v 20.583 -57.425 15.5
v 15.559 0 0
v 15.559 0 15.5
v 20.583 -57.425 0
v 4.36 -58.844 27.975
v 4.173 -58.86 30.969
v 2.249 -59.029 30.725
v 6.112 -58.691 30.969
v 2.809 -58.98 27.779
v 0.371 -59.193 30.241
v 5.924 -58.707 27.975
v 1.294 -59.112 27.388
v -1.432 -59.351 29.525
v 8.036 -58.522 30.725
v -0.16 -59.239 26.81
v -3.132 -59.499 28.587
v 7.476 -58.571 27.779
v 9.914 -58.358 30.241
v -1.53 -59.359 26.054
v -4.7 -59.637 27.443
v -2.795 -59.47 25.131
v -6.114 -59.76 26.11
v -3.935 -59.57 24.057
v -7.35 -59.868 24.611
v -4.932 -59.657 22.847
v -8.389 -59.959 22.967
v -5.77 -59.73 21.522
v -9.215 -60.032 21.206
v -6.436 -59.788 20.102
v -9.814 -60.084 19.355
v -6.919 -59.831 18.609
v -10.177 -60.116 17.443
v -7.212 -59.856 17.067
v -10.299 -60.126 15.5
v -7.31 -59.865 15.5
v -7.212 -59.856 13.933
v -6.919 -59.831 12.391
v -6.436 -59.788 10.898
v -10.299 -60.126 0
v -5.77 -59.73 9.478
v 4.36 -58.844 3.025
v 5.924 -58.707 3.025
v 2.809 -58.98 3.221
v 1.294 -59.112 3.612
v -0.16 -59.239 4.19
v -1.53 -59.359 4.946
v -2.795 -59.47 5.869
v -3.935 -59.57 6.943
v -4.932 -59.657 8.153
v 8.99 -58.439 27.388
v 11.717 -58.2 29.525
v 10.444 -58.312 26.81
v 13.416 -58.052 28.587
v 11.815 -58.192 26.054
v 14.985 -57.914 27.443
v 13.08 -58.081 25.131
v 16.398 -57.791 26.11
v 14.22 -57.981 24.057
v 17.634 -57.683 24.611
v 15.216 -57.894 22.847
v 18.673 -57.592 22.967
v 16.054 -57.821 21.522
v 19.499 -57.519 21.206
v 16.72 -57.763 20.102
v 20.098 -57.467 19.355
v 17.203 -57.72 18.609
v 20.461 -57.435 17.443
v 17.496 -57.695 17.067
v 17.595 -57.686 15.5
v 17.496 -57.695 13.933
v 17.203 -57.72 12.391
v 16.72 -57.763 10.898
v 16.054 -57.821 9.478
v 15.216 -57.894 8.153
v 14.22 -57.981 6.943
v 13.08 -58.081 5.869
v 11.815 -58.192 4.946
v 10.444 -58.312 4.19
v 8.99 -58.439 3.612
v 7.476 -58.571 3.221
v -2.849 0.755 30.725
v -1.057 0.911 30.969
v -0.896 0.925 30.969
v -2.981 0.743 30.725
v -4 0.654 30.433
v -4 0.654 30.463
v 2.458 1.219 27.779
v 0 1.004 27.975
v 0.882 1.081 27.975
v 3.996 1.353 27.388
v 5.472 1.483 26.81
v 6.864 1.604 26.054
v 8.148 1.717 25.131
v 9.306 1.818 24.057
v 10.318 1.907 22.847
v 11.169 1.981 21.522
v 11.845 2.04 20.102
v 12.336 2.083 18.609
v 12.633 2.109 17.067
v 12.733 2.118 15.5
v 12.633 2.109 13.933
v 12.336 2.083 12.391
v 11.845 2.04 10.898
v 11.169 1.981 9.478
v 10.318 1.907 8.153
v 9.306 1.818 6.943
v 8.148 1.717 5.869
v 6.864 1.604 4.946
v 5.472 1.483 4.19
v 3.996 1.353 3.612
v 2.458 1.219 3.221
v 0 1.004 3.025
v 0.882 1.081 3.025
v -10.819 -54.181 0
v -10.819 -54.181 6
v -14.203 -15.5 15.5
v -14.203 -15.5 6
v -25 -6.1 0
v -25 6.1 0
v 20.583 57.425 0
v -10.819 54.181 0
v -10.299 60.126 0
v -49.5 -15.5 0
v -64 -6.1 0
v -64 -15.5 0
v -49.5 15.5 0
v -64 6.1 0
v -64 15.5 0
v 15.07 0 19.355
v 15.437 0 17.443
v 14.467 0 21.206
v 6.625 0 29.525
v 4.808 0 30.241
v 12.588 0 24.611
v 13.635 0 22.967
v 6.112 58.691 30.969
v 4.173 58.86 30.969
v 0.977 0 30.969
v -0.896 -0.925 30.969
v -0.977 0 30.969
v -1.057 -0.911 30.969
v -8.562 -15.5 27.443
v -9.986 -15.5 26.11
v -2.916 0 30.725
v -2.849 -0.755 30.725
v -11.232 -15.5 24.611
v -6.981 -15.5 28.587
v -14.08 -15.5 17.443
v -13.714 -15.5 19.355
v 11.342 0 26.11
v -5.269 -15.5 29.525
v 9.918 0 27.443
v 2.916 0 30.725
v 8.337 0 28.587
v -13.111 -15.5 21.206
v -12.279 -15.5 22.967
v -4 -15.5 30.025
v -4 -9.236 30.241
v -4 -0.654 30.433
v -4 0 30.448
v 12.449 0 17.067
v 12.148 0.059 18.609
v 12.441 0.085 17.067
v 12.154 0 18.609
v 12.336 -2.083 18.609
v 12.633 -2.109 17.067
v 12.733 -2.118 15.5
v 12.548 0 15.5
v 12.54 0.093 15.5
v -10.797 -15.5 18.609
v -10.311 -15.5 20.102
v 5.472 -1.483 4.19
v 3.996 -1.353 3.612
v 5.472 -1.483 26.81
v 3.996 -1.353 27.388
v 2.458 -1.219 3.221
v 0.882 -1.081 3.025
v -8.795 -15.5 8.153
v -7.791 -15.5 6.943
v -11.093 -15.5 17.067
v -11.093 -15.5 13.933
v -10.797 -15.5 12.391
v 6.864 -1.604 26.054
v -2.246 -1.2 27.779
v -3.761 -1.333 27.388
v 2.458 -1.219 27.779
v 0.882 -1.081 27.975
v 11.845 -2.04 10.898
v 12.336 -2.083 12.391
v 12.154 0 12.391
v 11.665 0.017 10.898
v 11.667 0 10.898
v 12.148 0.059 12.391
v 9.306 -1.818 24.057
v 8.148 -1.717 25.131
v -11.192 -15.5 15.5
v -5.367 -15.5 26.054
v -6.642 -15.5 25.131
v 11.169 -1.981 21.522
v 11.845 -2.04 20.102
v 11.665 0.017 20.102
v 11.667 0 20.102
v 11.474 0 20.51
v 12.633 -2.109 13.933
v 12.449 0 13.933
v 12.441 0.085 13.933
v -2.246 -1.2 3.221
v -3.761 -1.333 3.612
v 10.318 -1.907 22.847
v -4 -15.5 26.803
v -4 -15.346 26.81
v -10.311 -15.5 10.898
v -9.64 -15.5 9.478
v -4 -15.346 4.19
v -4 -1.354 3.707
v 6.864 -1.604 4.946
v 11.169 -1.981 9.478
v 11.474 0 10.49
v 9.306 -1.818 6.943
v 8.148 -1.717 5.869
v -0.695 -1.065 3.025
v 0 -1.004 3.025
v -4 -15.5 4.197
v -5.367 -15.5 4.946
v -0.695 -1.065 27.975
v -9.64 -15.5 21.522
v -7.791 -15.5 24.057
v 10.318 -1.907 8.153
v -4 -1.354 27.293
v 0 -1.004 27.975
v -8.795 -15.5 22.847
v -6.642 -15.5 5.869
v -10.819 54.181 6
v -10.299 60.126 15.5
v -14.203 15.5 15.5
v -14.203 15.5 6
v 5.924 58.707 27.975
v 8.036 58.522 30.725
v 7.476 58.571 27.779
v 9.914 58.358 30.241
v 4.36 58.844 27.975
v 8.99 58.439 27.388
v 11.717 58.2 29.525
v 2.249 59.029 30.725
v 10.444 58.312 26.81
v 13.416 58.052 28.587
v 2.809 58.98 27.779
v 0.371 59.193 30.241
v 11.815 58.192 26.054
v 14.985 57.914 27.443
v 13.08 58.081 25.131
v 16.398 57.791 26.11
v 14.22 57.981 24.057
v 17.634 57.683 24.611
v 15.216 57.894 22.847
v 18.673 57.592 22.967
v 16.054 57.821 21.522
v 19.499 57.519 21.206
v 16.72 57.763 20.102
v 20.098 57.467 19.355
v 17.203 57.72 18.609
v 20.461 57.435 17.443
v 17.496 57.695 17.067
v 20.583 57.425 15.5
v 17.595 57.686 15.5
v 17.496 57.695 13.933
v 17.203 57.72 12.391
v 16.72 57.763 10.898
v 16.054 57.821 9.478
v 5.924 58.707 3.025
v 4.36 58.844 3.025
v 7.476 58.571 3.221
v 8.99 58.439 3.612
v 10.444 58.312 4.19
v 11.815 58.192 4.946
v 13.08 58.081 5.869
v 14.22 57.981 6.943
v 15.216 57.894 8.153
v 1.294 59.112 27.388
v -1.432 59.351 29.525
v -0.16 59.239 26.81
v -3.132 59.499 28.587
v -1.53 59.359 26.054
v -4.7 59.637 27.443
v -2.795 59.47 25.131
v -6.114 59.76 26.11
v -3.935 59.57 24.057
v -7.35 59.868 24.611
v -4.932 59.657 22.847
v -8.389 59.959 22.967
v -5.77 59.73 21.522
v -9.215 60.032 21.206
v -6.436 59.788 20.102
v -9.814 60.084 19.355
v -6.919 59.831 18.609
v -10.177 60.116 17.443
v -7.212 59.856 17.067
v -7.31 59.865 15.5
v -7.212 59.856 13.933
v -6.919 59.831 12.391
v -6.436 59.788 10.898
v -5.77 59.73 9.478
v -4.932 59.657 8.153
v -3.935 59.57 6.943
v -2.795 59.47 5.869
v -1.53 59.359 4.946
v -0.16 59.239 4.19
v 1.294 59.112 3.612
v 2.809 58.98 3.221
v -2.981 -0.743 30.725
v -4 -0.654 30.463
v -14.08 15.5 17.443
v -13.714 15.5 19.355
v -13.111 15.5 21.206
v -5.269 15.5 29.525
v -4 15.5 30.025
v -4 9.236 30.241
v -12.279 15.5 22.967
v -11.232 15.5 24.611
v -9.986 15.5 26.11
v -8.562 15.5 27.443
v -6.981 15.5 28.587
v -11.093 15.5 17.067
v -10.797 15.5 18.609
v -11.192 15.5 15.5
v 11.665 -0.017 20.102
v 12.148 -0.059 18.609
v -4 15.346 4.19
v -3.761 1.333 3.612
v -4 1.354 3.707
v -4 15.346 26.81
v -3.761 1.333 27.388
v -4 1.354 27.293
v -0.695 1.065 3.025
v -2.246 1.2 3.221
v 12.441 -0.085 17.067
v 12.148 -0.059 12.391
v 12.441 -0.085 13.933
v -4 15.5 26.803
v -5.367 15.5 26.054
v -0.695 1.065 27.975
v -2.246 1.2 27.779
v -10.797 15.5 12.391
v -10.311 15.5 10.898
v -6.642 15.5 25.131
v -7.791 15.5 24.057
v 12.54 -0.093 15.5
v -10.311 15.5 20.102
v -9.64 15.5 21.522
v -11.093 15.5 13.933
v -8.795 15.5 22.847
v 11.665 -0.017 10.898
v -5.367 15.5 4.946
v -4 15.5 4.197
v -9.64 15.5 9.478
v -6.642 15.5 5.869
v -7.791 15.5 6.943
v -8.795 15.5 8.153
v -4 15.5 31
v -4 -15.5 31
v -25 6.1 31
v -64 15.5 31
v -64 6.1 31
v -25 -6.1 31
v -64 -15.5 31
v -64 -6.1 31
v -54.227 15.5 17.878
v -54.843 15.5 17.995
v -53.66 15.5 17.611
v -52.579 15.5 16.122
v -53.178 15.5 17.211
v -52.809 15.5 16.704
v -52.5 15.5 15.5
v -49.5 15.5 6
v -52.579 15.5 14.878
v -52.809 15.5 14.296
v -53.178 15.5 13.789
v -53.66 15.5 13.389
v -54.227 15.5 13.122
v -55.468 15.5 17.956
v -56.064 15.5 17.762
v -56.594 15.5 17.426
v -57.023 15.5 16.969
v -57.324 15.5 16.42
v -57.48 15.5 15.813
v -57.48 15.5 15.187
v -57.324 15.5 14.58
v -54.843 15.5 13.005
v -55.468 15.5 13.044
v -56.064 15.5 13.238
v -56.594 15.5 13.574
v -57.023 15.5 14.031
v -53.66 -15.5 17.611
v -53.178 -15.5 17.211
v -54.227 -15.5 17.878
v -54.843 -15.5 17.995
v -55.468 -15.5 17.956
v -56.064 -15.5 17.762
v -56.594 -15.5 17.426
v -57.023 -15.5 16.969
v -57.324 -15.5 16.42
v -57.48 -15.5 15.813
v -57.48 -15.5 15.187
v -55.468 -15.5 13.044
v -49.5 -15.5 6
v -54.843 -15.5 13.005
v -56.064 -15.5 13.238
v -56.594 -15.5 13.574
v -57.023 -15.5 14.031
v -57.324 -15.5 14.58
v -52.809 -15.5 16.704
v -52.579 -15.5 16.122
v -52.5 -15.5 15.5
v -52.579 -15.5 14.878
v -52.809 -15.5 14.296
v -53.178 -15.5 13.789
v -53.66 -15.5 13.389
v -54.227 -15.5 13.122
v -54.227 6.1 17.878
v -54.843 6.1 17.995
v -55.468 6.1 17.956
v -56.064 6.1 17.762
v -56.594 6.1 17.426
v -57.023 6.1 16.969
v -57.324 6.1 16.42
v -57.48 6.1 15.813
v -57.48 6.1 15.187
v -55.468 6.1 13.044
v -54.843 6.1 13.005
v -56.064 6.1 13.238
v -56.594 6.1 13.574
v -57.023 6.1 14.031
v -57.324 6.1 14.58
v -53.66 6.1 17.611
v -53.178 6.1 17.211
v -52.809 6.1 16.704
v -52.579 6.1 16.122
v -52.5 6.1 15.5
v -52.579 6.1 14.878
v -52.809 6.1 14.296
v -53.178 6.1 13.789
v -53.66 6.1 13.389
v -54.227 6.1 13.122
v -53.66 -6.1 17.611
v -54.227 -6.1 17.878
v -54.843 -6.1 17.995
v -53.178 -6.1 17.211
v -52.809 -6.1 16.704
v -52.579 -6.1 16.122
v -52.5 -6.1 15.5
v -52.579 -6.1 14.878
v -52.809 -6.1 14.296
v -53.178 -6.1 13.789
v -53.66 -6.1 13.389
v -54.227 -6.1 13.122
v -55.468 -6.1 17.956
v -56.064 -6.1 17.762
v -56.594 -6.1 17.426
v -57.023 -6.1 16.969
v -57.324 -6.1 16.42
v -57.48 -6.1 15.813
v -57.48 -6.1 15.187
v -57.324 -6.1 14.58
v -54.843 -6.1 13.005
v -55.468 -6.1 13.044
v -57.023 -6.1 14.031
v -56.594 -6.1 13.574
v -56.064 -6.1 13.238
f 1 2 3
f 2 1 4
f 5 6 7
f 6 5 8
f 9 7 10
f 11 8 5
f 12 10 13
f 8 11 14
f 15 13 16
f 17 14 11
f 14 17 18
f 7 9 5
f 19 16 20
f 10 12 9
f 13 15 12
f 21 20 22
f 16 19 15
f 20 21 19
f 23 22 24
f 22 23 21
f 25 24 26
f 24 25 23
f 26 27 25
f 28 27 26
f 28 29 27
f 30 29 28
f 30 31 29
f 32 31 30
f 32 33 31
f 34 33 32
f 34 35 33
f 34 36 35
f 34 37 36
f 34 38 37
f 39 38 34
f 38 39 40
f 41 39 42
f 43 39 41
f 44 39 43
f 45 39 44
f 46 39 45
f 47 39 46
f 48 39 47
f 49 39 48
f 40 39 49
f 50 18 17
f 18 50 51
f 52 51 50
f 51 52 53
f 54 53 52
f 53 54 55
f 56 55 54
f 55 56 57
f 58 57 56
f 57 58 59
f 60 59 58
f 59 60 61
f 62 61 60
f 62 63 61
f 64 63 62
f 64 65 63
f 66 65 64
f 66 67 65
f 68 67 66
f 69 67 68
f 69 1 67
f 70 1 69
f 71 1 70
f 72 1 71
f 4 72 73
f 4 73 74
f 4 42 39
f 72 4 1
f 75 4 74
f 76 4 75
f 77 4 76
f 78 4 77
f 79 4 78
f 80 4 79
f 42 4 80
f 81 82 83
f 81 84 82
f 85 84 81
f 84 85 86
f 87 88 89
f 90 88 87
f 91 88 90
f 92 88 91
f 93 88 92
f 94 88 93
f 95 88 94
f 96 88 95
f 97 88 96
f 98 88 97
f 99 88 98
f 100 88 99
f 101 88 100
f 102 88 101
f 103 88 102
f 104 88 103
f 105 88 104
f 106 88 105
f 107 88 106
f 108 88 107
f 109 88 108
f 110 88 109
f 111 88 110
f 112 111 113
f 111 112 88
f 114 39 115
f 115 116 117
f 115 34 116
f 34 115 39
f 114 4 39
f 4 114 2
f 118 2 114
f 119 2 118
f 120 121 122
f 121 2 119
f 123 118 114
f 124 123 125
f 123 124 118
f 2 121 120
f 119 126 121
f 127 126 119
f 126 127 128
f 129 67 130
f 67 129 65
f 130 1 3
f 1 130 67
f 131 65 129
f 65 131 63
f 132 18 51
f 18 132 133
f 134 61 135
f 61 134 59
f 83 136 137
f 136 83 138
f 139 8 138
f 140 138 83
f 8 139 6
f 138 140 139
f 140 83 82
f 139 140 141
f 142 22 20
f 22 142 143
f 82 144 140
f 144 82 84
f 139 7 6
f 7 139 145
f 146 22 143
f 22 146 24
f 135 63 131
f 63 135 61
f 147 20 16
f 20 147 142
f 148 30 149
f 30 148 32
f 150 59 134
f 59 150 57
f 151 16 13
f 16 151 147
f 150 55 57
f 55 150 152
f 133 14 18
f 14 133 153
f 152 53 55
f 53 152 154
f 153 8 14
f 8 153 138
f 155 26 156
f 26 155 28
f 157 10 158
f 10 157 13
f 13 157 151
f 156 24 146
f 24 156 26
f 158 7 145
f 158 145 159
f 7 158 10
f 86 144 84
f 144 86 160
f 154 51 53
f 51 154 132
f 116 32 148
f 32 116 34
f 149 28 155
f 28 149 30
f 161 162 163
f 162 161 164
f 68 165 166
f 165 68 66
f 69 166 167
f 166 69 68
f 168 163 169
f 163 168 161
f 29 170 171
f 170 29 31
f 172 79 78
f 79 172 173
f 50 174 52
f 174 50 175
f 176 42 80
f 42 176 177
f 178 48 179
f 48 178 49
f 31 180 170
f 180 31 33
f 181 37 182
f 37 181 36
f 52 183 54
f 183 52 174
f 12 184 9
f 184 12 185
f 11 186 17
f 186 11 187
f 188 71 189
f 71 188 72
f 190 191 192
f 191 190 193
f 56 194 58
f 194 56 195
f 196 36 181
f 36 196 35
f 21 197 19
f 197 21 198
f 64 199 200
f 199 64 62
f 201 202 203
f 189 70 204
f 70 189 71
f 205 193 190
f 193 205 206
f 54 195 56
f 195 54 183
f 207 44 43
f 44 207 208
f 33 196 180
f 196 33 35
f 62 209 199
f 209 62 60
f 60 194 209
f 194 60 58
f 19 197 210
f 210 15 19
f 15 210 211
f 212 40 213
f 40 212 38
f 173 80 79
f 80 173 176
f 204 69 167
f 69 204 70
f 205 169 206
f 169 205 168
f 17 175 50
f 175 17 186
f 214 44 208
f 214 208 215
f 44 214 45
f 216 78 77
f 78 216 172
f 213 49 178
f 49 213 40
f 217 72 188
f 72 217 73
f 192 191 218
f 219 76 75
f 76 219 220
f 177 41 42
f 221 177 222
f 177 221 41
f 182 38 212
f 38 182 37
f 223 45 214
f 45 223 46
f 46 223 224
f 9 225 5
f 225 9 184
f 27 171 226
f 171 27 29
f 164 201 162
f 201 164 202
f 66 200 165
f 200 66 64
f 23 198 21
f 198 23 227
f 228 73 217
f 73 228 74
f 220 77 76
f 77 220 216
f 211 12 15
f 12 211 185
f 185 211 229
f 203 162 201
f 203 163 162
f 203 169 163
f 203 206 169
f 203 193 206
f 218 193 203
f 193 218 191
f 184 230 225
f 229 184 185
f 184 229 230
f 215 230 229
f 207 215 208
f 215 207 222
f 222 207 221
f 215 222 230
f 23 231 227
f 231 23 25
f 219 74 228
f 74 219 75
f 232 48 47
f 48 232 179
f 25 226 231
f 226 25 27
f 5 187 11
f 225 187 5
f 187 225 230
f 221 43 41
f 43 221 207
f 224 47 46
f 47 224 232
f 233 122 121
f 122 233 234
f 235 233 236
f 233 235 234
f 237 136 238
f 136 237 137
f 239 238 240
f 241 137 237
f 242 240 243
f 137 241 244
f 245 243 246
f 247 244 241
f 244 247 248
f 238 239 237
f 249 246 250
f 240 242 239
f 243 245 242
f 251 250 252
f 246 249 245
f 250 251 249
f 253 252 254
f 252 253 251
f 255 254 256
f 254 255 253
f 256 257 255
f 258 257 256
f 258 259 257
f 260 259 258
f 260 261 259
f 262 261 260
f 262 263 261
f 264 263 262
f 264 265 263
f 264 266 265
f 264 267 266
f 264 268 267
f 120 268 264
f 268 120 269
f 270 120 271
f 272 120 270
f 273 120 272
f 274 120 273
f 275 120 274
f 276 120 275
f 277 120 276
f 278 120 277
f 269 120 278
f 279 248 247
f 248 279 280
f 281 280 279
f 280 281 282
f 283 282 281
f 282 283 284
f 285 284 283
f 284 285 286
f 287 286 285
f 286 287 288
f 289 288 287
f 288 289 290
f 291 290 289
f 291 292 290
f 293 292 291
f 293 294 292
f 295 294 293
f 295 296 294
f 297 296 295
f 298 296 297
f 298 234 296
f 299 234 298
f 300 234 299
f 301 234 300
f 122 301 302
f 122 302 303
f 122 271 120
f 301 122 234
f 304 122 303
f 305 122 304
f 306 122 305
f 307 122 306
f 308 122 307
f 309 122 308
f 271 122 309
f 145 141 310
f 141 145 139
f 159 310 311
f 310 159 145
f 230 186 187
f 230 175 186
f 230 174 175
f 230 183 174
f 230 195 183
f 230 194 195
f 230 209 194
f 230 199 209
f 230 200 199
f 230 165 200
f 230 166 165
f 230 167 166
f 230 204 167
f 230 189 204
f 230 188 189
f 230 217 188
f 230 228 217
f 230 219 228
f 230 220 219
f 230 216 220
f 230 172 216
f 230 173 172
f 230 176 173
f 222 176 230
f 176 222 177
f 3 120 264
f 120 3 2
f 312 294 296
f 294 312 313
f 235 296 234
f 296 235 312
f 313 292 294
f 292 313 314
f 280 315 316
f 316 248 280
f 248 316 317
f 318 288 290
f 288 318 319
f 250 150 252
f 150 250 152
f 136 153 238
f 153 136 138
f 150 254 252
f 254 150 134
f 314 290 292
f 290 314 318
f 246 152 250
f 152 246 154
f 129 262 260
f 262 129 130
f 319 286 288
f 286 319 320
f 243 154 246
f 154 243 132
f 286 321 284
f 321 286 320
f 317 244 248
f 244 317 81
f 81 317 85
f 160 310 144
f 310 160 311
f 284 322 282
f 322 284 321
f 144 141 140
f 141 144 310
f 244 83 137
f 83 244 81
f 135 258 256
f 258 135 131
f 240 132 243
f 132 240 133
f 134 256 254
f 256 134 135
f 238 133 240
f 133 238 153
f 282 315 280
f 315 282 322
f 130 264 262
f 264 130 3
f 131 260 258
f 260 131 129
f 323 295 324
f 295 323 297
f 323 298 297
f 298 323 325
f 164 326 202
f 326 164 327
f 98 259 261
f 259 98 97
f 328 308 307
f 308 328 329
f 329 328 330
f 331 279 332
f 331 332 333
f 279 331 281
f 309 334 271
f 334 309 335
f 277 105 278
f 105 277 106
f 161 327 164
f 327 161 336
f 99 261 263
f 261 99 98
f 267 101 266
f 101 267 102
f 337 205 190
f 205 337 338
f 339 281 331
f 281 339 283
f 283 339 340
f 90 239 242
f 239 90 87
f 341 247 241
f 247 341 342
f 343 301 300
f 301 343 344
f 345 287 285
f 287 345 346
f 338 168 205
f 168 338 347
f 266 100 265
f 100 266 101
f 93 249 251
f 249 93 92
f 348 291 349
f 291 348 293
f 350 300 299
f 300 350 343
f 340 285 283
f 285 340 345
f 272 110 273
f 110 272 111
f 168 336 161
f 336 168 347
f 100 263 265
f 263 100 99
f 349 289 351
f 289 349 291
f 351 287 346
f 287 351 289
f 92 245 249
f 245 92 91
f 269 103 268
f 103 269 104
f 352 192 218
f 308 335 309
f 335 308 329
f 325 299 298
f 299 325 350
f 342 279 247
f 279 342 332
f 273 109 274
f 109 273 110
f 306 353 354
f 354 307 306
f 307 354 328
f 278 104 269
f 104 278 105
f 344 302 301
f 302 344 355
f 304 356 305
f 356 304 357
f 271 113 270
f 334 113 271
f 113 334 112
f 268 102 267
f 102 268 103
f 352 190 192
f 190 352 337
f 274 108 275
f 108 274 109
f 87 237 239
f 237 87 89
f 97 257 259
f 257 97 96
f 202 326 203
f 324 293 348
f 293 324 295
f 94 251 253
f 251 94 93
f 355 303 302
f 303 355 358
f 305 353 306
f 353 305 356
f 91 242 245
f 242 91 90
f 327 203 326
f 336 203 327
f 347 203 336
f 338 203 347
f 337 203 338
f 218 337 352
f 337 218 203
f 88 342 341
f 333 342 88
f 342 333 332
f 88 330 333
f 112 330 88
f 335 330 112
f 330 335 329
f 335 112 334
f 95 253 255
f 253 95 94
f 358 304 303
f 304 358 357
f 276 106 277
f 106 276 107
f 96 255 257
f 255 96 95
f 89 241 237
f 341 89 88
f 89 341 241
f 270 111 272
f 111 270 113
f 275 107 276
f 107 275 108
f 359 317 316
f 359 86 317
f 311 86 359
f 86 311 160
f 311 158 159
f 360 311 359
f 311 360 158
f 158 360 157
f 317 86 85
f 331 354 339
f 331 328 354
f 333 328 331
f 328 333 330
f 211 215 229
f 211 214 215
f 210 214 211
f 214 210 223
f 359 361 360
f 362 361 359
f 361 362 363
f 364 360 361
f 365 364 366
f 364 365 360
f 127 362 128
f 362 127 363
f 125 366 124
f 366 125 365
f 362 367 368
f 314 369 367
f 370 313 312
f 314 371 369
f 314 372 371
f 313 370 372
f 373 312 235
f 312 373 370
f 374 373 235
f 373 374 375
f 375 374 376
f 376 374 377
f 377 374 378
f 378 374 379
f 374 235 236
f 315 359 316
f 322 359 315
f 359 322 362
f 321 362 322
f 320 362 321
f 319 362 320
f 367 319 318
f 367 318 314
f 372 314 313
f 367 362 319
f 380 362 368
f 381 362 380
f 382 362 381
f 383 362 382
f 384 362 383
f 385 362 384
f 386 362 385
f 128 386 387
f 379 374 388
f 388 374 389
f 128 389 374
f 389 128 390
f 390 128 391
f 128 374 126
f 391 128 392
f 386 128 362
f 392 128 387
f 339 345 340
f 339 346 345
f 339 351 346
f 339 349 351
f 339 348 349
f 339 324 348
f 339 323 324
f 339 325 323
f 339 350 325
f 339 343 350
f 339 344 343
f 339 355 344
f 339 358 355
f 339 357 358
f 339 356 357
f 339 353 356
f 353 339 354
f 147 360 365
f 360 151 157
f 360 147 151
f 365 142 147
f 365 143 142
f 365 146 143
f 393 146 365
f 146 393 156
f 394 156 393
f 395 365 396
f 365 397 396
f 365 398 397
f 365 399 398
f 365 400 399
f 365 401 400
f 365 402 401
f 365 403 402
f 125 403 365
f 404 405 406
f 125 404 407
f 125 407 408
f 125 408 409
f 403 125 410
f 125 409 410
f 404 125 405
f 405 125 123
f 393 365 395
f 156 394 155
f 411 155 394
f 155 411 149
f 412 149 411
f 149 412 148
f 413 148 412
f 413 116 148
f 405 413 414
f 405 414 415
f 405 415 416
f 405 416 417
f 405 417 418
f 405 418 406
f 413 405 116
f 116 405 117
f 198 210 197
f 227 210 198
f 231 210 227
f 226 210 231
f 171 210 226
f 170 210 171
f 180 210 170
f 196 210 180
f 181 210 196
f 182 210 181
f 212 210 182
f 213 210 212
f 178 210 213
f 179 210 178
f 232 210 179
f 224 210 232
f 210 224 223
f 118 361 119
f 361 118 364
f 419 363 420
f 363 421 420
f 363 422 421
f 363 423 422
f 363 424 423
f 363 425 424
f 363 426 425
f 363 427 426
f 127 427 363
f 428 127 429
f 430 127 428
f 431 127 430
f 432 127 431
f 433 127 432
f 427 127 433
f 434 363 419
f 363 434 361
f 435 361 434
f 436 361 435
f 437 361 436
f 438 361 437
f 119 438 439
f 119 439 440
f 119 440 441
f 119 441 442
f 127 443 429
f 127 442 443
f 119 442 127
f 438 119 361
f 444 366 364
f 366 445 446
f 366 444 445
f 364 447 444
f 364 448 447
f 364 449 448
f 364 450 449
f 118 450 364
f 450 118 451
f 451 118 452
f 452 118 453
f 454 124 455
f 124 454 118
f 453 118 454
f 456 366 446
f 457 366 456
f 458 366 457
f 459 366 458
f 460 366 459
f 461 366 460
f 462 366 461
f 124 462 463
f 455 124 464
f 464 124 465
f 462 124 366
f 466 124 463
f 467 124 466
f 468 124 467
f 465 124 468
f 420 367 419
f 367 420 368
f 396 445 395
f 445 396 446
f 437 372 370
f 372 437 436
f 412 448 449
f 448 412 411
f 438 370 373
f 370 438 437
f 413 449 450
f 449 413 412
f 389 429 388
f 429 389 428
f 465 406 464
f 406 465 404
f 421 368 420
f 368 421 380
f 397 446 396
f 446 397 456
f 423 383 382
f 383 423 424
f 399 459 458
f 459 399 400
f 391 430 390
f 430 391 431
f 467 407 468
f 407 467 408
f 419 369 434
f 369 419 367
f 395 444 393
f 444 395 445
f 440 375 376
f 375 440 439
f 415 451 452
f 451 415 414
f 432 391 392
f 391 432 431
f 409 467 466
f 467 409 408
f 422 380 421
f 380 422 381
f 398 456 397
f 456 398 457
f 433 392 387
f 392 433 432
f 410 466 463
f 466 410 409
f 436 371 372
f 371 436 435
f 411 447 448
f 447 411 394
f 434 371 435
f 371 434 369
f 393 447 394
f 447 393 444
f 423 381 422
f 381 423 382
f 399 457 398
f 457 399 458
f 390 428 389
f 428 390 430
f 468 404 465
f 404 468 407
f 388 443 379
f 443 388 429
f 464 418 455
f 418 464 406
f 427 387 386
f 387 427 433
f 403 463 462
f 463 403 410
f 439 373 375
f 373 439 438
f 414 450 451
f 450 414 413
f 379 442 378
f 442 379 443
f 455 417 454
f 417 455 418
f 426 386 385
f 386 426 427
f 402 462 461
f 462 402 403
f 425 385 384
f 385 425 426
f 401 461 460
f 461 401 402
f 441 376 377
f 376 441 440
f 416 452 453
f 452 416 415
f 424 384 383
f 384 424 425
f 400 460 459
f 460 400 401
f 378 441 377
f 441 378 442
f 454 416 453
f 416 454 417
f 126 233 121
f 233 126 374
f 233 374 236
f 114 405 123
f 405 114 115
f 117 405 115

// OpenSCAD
//Polargraph board feet

//Mark Benson CCNC 2015

//What sort of feet are these?

module cap()
{
    rotate([90,0,0])
    difference()
    {
        union()
        {
            translate([0,(31/2)/2,0])
            cube([31,31/2,60], center=true);
    
            translate([0,31/2,0])
            cylinder(r=31/2, h=60, $fn=50, center=true);
        }
        
        union()
        {
            translate([0,31/2,1])
            cylinder(r=25/2, h=58, $fn=50, center=true);        
        }
    }
}

//Side strengthening rib
module strengtheningRib()
{
polyhedron(
  points=[ [0,0,0],[3,0,0],[3,10,0],[0,10,0],[0,10,10],[3,10,10]  ],
  faces=[ [0,1,3],[1,2,3],[0,3,4],[0,4,1],[1,4,5],[1,5,2],[2,5,4],[2,4,3] ]
 );
}

difference()
{
    union()
    {
        rotate([0,0,5])
        translate([0,-29,0])
        cap();
        
        rotate([0,0,-5-180])
        translate([0,-29,0])
        cap();
        
        translate([-34,0,31/2])
        cube([60,31,31], center=true);
    }

    union()
    {
        translate([-60,0,31/2])
        cube([70,12.2,31], center=true);

        translate([-55,50,31/2])
        rotate([90,0,0])
        cylinder(r=5/2, h=100, $fn=25);
    }
}

translate([-10,55,6])
rotate([0,90,180])
scale([2,4,4])
strengtheningRib();

mirror([0,1,0])
translate([-10,55,6])
rotate([0,90,180])
scale([2,4,4])
strengtheningRib();
